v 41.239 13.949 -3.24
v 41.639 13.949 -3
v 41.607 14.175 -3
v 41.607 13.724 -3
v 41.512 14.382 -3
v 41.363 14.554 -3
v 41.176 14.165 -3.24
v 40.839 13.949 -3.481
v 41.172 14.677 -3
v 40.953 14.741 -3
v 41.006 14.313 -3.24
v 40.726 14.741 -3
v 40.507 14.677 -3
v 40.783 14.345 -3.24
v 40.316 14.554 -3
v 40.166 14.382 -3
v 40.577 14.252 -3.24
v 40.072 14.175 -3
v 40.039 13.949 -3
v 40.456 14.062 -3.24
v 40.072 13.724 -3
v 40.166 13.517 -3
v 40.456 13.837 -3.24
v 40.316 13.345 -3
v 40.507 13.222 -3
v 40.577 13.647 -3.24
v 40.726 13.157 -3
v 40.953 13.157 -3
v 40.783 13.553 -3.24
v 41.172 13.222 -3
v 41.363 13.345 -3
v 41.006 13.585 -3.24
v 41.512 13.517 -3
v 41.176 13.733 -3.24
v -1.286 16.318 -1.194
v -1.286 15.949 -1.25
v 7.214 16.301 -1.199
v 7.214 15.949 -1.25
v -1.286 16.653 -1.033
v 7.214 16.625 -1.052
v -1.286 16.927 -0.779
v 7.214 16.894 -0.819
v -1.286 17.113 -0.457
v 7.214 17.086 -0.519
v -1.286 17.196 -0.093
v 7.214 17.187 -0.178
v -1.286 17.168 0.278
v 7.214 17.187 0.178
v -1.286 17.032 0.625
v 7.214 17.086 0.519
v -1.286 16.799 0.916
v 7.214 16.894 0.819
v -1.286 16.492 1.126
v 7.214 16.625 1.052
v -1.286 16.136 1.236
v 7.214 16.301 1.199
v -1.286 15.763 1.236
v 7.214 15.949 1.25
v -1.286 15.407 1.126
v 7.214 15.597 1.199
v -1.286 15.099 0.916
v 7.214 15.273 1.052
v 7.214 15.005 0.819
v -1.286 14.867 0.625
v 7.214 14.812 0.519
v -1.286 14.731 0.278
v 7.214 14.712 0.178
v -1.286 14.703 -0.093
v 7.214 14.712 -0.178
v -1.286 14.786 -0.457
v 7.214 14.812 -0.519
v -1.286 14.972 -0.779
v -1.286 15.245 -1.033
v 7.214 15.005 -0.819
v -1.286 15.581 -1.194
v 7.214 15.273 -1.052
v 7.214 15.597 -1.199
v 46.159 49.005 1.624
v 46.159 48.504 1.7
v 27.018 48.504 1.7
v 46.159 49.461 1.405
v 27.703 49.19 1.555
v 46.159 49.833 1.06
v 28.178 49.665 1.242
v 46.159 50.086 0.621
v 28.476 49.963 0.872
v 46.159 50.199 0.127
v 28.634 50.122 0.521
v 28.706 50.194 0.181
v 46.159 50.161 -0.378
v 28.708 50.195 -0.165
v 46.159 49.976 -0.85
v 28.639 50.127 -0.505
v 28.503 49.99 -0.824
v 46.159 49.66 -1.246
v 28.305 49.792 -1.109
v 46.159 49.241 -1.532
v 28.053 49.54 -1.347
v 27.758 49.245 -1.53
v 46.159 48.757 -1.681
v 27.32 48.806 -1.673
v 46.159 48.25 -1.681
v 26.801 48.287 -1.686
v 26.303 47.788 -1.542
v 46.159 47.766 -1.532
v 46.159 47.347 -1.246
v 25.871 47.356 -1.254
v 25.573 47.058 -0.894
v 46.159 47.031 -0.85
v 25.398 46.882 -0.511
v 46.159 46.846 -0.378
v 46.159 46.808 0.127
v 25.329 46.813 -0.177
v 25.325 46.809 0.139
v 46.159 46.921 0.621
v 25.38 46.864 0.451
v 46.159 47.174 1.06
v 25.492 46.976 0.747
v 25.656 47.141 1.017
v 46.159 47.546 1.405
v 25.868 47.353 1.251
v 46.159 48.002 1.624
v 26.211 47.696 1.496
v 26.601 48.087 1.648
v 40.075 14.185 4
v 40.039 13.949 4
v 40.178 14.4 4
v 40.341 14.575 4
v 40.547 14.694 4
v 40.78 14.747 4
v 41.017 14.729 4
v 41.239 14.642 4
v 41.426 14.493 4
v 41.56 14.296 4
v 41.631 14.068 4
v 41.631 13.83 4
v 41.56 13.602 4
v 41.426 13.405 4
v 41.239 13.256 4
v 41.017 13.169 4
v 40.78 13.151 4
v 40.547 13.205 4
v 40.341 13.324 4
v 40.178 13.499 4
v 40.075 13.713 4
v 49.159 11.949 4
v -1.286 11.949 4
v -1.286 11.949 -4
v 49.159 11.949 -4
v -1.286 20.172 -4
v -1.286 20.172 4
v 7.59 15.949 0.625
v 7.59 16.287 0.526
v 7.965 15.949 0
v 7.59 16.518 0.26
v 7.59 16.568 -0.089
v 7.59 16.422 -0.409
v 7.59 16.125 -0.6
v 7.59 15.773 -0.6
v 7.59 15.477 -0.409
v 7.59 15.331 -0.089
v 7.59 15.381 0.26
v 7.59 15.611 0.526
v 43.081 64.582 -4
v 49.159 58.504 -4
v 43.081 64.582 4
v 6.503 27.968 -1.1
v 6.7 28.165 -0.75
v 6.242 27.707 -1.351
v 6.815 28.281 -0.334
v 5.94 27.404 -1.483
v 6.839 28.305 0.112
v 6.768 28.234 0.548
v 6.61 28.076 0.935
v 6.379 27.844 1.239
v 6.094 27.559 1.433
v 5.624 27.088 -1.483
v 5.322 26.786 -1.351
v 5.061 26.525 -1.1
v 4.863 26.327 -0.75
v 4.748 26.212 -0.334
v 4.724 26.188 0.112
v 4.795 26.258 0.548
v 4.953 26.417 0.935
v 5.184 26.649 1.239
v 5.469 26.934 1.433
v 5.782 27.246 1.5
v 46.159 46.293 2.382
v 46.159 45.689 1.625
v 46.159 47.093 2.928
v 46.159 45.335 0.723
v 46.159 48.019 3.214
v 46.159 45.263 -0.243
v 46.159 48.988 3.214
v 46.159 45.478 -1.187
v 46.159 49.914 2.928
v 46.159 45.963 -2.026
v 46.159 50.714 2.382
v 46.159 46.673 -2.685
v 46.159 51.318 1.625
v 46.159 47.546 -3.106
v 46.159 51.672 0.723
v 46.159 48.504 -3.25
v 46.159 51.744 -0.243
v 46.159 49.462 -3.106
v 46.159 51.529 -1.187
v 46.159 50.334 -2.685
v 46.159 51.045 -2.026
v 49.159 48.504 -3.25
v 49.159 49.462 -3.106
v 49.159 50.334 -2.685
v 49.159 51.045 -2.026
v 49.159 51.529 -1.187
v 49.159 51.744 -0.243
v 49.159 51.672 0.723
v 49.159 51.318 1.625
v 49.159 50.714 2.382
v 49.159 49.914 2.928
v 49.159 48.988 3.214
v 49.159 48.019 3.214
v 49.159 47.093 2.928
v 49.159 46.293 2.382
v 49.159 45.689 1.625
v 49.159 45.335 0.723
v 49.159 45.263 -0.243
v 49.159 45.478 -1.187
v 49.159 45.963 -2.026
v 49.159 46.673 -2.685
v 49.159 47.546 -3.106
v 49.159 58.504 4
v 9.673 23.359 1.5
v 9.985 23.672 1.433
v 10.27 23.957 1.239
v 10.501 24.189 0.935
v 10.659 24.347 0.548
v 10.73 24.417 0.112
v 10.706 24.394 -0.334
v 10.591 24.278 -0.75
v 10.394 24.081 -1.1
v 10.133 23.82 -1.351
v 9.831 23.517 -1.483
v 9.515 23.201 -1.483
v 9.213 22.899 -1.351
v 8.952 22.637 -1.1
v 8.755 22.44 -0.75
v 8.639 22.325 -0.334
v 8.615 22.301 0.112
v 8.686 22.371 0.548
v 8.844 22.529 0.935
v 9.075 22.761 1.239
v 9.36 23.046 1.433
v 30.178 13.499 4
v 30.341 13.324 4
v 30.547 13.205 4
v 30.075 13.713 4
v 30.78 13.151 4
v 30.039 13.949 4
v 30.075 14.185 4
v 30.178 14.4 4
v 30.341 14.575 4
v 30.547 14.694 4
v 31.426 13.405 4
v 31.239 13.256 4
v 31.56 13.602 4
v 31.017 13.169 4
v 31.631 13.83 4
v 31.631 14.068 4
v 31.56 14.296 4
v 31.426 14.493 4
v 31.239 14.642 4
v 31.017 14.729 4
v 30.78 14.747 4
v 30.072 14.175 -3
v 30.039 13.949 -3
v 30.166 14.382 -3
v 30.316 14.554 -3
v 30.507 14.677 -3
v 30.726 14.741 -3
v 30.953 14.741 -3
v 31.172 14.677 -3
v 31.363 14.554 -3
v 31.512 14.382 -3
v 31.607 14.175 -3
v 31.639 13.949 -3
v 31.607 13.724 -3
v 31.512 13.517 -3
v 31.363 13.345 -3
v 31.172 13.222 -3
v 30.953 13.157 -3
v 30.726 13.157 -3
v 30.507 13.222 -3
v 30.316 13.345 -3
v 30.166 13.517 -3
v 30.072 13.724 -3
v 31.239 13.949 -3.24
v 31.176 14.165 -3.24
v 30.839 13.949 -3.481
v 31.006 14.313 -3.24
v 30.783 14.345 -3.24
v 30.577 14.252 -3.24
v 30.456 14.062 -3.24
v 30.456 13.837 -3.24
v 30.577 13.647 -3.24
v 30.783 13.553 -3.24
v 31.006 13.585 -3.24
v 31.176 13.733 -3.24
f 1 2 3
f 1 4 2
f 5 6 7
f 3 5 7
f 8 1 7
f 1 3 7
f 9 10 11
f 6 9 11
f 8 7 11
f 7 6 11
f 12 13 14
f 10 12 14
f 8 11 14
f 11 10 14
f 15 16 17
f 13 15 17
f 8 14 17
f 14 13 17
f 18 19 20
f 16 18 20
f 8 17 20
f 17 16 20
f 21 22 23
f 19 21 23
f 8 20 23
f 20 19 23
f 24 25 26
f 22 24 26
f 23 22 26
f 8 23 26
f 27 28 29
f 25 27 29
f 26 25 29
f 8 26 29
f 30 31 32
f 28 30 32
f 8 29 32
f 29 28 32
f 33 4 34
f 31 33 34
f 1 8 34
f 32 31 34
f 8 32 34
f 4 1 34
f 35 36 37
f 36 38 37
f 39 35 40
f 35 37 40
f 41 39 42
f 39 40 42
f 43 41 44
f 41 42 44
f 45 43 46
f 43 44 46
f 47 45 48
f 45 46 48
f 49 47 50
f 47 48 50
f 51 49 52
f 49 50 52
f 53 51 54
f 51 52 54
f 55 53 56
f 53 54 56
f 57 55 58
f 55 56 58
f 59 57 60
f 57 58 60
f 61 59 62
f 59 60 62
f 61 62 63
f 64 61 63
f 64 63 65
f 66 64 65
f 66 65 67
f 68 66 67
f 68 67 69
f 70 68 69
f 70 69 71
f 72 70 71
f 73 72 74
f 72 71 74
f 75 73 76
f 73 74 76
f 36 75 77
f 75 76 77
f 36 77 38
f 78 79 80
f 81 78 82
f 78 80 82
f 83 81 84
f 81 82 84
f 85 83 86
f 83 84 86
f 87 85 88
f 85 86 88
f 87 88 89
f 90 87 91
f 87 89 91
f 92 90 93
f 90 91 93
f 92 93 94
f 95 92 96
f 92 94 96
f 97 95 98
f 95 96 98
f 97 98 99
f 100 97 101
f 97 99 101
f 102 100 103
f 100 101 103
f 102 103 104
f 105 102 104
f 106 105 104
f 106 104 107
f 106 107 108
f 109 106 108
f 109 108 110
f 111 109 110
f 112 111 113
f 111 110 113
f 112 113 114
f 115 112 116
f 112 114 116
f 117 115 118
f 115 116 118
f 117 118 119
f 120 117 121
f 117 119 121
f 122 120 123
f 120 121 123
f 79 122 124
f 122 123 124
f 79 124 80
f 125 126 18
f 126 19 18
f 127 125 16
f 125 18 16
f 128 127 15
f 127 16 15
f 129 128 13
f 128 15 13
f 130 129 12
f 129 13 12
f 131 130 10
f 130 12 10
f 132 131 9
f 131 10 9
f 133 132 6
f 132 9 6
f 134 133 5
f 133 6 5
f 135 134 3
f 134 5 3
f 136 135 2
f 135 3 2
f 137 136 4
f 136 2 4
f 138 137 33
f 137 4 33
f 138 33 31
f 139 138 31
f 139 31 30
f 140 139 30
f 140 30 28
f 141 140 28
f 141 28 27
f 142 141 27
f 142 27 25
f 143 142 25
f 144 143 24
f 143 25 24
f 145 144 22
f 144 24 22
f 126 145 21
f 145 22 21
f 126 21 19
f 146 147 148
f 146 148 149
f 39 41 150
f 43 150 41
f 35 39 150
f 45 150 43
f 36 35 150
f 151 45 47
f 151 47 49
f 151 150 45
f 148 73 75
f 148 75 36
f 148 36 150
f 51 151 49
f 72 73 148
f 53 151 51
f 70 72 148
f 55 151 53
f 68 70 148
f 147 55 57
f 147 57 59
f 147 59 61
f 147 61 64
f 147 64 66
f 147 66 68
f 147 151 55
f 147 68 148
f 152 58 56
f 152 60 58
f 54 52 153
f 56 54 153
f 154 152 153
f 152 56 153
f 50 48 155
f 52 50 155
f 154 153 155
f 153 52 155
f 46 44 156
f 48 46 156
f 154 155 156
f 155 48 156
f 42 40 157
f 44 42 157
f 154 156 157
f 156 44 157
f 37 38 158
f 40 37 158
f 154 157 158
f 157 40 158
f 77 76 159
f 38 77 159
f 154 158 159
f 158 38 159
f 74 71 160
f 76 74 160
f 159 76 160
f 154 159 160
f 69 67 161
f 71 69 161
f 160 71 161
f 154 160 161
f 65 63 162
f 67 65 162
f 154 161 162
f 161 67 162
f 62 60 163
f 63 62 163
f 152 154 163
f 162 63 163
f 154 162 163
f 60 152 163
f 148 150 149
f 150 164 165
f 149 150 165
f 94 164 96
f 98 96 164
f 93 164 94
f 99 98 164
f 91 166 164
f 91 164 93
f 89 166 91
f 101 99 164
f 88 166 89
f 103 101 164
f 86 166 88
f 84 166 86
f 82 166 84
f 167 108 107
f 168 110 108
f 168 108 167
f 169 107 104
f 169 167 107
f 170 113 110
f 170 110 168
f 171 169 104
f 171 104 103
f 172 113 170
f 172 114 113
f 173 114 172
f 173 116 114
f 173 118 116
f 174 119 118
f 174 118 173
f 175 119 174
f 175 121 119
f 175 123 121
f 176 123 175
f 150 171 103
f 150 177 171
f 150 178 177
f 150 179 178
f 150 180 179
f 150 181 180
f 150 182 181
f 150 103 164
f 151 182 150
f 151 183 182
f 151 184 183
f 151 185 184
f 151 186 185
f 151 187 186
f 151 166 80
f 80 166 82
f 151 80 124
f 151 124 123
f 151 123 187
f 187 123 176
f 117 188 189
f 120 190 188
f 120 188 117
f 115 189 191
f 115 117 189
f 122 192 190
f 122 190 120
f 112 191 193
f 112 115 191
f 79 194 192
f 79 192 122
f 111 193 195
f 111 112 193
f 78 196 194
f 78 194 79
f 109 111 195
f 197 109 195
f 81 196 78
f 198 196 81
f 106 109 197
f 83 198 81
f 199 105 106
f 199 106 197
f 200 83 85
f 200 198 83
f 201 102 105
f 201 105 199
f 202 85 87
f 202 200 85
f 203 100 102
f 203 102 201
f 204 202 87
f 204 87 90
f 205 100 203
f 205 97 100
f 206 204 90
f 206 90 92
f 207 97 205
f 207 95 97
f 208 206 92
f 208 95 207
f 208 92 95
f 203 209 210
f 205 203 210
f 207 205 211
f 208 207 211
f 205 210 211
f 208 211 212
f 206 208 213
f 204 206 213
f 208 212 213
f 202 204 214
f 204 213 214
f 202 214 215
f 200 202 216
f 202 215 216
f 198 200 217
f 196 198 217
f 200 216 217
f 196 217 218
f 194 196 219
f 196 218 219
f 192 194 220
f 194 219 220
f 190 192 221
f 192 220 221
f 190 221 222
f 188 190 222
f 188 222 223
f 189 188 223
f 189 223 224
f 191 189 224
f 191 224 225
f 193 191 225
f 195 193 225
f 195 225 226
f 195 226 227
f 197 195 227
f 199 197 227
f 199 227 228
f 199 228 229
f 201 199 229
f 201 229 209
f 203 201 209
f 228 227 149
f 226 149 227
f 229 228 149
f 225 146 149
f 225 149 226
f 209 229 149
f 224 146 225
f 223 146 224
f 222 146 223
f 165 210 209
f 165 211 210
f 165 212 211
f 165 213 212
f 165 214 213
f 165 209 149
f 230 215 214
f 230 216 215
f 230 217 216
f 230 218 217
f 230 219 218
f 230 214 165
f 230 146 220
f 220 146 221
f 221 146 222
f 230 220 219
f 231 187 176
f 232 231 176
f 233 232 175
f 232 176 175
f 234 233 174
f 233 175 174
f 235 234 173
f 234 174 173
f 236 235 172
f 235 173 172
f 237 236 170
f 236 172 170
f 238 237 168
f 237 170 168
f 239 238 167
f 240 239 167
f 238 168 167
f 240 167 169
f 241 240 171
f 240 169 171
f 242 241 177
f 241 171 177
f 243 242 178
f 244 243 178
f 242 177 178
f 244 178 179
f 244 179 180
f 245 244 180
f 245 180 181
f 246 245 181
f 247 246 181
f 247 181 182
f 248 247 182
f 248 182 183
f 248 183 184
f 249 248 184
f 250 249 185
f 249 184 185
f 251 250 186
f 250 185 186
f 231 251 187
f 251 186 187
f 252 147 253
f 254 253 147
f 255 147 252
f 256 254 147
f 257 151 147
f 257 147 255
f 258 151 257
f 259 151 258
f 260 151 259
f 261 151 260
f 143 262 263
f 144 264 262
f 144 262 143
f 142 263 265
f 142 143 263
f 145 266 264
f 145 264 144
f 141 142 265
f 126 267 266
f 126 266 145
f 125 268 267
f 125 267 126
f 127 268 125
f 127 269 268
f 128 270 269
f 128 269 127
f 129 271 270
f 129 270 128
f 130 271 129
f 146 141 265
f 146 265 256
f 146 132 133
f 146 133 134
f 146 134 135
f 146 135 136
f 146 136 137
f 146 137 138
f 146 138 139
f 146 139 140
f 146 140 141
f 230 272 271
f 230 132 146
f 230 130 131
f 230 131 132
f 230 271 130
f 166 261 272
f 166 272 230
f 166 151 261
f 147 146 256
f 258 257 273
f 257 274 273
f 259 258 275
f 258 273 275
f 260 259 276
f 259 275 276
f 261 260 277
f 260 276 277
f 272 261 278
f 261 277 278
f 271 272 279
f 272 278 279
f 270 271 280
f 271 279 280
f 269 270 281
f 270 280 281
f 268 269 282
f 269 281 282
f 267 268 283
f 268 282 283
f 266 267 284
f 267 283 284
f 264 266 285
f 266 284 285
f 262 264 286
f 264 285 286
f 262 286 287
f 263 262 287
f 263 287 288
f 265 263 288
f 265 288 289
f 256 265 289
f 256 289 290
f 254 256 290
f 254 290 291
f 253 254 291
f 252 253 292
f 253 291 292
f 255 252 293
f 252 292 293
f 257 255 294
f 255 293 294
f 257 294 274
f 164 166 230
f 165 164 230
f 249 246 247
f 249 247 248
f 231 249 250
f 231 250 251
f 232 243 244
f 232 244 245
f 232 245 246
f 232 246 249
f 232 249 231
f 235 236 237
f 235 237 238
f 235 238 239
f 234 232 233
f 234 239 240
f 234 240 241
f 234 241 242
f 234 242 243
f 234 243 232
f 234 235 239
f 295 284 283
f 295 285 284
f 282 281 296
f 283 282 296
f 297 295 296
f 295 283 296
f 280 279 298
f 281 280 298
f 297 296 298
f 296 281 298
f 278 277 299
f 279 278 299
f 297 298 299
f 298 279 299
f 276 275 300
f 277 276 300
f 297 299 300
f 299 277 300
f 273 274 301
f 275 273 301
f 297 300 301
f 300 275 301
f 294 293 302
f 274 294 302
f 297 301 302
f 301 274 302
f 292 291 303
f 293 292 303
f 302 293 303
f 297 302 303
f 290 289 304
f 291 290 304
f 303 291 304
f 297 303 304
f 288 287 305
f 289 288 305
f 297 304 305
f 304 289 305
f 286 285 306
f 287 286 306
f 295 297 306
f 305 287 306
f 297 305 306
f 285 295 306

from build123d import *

# Parameters (mm, degrees)
BOSS_EXTRUDE1_DEPTH            = 4
SKETCH3_W                      = 59.68
SKETCH3_H                      = 8
BOSS_EXTRUDE2_DEPTH            = 5.46
SKETCH5_W                      = 2.16
SKETCH5_H                      = 59.704316385
CUT_EXTRUDE2_DEPTH             = 9
CUT_EXTRUDE3_DEPTH             = 9
CBORE_FOR_M3_SHCS2_D           = 3.4
CBORE_FOR_M3_SHCS2_CBORE_D     = 6.5
CBORE_FOR_M3_SHCS2_CBORE_DEPTH = 3
M2X0_4_TAPPED_HOLE1_D          = 1.6
M2X0_4_TAPPED_HOLE1_DEPTH      = 7
M2X0_4_TAPPED_HOLE1_TIP        = 0.480688495
CUT_EXTRUDE4_DEPTH             = 9
SKETCH22_R                     = 1.5
CUT_EXTRUDE6_DEPTH             = 5.5
M3X0_5_TAPPED_HOLE2_D          = 2.5
M3X0_5_TAPPED_HOLE2_DEPTH      = 8.5
M3X0_5_TAPPED_HOLE2_TIP        = 0.751075774


with BuildPart() as part:
    # Sketch2 → Boss-Extrude1 (new body, symmetric)
    with BuildSketch(Plane.XY):
        Polygon((-8.360559535, 17.409242356), (51.319440465, 17.409242356), (51.319440465, 71.653558741), (36.009440465, 71.653558741), (43.084036895, 64.586021309), (-1.285963105, 20.171704924), (-8.360559535, 27.239242356), align=None)
    extrude(amount=BOSS_EXTRUDE1_DEPTH, both=True)

    # Sketch3 → Boss-Extrude2 (add)
    with BuildSketch(Plane.XZ.offset(-17.409242356)):
        with Locations((21.479440465, 0)):
            Rectangle(SKETCH3_W, SKETCH3_H)
    extrude(amount=BOSS_EXTRUDE2_DEPTH)

    # Sketch5 → Cut-Extrude2 (cut, through all)
    with BuildSketch(Plane.XY.offset(4)):
        with Locations((50.239440465, 41.801400548)):
            Rectangle(SKETCH5_W, SKETCH5_H)
    extrude(amount=-CUT_EXTRUDE2_DEPTH, mode=Mode.SUBTRACT)

    # Sketch9 → Cut-Extrude3 (cut, through all)
    with BuildSketch(Plane.XY.offset(4)):
        Polygon((36.009440465, 71.653558741), (49.159440465, 58.503558741), (49.159440465, 71.653558741), align=None)
    extrude(amount=-CUT_EXTRUDE3_DEPTH, mode=Mode.SUBTRACT)

    # CBORE for M3 SHCS2 (through all)
    with Locations(Plane(origin=(49.159440465, 0, 0), x_dir=(0, 0, -1), z_dir=(1, 0, 0))):
        with Locations((0, 48.503558741)):
            CounterBoreHole(CBORE_FOR_M3_SHCS2_D / 2, CBORE_FOR_M3_SHCS2_CBORE_D / 2, CBORE_FOR_M3_SHCS2_CBORE_DEPTH)

    # M2x0.4 Tapped Hole1
    with Locations(Plane.XY.offset(4)):
        with Locations((30.839440465, 13.949242356), (40.839440465, 13.949242356)):
            Hole(M2X0_4_TAPPED_HOLE1_D / 2, depth=M2X0_4_TAPPED_HOLE1_DEPTH)
            with Locations((0, 0, -(M2X0_4_TAPPED_HOLE1_DEPTH + M2X0_4_TAPPED_HOLE1_TIP / 2))):  # 118° drill point
                Cone(0, M2X0_4_TAPPED_HOLE1_D / 2, M2X0_4_TAPPED_HOLE1_TIP, mode=Mode.SUBTRACT)

    # Sketch20 → Cut-Extrude4 (cut, through all)
    with BuildSketch(Plane.XY.offset(4)):
        Polygon((-1.285963105, 20.171704924), (-1.285963105, 11.949242356), (-8.360559535, 11.949242356), (-8.360559535, 27.239242356), align=None)
    extrude(amount=-CUT_EXTRUDE4_DEPTH, mode=Mode.SUBTRACT)

    # Sketch22 → Cut-Extrude6 (cut)
    with BuildSketch(Plane(origin=(-10.729470873, 10.71876506, 0), x_dir=(0, 0, 1), z_dir=(-0.707459643, 0.706753743, 0))):
        with Locations((0, 23.361807925)):
            Circle(SKETCH22_R)
    extrude(amount=-CUT_EXTRUDE6_DEPTH, mode=Mode.SUBTRACT)

    # M3x0.5 Tapped Hole2
    with Locations(Plane.ZY.offset(1.285963105)):
        with Locations((0, 15.949242356)):
            Hole(M3X0_5_TAPPED_HOLE2_D / 2, depth=M3X0_5_TAPPED_HOLE2_DEPTH)
            with Locations((0, 0, -(M3X0_5_TAPPED_HOLE2_DEPTH + M3X0_5_TAPPED_HOLE2_TIP / 2))):  # 118° drill point
                Cone(0, M3X0_5_TAPPED_HOLE2_D / 2, M3X0_5_TAPPED_HOLE2_TIP, mode=Mode.SUBTRACT)


solid = part.part
